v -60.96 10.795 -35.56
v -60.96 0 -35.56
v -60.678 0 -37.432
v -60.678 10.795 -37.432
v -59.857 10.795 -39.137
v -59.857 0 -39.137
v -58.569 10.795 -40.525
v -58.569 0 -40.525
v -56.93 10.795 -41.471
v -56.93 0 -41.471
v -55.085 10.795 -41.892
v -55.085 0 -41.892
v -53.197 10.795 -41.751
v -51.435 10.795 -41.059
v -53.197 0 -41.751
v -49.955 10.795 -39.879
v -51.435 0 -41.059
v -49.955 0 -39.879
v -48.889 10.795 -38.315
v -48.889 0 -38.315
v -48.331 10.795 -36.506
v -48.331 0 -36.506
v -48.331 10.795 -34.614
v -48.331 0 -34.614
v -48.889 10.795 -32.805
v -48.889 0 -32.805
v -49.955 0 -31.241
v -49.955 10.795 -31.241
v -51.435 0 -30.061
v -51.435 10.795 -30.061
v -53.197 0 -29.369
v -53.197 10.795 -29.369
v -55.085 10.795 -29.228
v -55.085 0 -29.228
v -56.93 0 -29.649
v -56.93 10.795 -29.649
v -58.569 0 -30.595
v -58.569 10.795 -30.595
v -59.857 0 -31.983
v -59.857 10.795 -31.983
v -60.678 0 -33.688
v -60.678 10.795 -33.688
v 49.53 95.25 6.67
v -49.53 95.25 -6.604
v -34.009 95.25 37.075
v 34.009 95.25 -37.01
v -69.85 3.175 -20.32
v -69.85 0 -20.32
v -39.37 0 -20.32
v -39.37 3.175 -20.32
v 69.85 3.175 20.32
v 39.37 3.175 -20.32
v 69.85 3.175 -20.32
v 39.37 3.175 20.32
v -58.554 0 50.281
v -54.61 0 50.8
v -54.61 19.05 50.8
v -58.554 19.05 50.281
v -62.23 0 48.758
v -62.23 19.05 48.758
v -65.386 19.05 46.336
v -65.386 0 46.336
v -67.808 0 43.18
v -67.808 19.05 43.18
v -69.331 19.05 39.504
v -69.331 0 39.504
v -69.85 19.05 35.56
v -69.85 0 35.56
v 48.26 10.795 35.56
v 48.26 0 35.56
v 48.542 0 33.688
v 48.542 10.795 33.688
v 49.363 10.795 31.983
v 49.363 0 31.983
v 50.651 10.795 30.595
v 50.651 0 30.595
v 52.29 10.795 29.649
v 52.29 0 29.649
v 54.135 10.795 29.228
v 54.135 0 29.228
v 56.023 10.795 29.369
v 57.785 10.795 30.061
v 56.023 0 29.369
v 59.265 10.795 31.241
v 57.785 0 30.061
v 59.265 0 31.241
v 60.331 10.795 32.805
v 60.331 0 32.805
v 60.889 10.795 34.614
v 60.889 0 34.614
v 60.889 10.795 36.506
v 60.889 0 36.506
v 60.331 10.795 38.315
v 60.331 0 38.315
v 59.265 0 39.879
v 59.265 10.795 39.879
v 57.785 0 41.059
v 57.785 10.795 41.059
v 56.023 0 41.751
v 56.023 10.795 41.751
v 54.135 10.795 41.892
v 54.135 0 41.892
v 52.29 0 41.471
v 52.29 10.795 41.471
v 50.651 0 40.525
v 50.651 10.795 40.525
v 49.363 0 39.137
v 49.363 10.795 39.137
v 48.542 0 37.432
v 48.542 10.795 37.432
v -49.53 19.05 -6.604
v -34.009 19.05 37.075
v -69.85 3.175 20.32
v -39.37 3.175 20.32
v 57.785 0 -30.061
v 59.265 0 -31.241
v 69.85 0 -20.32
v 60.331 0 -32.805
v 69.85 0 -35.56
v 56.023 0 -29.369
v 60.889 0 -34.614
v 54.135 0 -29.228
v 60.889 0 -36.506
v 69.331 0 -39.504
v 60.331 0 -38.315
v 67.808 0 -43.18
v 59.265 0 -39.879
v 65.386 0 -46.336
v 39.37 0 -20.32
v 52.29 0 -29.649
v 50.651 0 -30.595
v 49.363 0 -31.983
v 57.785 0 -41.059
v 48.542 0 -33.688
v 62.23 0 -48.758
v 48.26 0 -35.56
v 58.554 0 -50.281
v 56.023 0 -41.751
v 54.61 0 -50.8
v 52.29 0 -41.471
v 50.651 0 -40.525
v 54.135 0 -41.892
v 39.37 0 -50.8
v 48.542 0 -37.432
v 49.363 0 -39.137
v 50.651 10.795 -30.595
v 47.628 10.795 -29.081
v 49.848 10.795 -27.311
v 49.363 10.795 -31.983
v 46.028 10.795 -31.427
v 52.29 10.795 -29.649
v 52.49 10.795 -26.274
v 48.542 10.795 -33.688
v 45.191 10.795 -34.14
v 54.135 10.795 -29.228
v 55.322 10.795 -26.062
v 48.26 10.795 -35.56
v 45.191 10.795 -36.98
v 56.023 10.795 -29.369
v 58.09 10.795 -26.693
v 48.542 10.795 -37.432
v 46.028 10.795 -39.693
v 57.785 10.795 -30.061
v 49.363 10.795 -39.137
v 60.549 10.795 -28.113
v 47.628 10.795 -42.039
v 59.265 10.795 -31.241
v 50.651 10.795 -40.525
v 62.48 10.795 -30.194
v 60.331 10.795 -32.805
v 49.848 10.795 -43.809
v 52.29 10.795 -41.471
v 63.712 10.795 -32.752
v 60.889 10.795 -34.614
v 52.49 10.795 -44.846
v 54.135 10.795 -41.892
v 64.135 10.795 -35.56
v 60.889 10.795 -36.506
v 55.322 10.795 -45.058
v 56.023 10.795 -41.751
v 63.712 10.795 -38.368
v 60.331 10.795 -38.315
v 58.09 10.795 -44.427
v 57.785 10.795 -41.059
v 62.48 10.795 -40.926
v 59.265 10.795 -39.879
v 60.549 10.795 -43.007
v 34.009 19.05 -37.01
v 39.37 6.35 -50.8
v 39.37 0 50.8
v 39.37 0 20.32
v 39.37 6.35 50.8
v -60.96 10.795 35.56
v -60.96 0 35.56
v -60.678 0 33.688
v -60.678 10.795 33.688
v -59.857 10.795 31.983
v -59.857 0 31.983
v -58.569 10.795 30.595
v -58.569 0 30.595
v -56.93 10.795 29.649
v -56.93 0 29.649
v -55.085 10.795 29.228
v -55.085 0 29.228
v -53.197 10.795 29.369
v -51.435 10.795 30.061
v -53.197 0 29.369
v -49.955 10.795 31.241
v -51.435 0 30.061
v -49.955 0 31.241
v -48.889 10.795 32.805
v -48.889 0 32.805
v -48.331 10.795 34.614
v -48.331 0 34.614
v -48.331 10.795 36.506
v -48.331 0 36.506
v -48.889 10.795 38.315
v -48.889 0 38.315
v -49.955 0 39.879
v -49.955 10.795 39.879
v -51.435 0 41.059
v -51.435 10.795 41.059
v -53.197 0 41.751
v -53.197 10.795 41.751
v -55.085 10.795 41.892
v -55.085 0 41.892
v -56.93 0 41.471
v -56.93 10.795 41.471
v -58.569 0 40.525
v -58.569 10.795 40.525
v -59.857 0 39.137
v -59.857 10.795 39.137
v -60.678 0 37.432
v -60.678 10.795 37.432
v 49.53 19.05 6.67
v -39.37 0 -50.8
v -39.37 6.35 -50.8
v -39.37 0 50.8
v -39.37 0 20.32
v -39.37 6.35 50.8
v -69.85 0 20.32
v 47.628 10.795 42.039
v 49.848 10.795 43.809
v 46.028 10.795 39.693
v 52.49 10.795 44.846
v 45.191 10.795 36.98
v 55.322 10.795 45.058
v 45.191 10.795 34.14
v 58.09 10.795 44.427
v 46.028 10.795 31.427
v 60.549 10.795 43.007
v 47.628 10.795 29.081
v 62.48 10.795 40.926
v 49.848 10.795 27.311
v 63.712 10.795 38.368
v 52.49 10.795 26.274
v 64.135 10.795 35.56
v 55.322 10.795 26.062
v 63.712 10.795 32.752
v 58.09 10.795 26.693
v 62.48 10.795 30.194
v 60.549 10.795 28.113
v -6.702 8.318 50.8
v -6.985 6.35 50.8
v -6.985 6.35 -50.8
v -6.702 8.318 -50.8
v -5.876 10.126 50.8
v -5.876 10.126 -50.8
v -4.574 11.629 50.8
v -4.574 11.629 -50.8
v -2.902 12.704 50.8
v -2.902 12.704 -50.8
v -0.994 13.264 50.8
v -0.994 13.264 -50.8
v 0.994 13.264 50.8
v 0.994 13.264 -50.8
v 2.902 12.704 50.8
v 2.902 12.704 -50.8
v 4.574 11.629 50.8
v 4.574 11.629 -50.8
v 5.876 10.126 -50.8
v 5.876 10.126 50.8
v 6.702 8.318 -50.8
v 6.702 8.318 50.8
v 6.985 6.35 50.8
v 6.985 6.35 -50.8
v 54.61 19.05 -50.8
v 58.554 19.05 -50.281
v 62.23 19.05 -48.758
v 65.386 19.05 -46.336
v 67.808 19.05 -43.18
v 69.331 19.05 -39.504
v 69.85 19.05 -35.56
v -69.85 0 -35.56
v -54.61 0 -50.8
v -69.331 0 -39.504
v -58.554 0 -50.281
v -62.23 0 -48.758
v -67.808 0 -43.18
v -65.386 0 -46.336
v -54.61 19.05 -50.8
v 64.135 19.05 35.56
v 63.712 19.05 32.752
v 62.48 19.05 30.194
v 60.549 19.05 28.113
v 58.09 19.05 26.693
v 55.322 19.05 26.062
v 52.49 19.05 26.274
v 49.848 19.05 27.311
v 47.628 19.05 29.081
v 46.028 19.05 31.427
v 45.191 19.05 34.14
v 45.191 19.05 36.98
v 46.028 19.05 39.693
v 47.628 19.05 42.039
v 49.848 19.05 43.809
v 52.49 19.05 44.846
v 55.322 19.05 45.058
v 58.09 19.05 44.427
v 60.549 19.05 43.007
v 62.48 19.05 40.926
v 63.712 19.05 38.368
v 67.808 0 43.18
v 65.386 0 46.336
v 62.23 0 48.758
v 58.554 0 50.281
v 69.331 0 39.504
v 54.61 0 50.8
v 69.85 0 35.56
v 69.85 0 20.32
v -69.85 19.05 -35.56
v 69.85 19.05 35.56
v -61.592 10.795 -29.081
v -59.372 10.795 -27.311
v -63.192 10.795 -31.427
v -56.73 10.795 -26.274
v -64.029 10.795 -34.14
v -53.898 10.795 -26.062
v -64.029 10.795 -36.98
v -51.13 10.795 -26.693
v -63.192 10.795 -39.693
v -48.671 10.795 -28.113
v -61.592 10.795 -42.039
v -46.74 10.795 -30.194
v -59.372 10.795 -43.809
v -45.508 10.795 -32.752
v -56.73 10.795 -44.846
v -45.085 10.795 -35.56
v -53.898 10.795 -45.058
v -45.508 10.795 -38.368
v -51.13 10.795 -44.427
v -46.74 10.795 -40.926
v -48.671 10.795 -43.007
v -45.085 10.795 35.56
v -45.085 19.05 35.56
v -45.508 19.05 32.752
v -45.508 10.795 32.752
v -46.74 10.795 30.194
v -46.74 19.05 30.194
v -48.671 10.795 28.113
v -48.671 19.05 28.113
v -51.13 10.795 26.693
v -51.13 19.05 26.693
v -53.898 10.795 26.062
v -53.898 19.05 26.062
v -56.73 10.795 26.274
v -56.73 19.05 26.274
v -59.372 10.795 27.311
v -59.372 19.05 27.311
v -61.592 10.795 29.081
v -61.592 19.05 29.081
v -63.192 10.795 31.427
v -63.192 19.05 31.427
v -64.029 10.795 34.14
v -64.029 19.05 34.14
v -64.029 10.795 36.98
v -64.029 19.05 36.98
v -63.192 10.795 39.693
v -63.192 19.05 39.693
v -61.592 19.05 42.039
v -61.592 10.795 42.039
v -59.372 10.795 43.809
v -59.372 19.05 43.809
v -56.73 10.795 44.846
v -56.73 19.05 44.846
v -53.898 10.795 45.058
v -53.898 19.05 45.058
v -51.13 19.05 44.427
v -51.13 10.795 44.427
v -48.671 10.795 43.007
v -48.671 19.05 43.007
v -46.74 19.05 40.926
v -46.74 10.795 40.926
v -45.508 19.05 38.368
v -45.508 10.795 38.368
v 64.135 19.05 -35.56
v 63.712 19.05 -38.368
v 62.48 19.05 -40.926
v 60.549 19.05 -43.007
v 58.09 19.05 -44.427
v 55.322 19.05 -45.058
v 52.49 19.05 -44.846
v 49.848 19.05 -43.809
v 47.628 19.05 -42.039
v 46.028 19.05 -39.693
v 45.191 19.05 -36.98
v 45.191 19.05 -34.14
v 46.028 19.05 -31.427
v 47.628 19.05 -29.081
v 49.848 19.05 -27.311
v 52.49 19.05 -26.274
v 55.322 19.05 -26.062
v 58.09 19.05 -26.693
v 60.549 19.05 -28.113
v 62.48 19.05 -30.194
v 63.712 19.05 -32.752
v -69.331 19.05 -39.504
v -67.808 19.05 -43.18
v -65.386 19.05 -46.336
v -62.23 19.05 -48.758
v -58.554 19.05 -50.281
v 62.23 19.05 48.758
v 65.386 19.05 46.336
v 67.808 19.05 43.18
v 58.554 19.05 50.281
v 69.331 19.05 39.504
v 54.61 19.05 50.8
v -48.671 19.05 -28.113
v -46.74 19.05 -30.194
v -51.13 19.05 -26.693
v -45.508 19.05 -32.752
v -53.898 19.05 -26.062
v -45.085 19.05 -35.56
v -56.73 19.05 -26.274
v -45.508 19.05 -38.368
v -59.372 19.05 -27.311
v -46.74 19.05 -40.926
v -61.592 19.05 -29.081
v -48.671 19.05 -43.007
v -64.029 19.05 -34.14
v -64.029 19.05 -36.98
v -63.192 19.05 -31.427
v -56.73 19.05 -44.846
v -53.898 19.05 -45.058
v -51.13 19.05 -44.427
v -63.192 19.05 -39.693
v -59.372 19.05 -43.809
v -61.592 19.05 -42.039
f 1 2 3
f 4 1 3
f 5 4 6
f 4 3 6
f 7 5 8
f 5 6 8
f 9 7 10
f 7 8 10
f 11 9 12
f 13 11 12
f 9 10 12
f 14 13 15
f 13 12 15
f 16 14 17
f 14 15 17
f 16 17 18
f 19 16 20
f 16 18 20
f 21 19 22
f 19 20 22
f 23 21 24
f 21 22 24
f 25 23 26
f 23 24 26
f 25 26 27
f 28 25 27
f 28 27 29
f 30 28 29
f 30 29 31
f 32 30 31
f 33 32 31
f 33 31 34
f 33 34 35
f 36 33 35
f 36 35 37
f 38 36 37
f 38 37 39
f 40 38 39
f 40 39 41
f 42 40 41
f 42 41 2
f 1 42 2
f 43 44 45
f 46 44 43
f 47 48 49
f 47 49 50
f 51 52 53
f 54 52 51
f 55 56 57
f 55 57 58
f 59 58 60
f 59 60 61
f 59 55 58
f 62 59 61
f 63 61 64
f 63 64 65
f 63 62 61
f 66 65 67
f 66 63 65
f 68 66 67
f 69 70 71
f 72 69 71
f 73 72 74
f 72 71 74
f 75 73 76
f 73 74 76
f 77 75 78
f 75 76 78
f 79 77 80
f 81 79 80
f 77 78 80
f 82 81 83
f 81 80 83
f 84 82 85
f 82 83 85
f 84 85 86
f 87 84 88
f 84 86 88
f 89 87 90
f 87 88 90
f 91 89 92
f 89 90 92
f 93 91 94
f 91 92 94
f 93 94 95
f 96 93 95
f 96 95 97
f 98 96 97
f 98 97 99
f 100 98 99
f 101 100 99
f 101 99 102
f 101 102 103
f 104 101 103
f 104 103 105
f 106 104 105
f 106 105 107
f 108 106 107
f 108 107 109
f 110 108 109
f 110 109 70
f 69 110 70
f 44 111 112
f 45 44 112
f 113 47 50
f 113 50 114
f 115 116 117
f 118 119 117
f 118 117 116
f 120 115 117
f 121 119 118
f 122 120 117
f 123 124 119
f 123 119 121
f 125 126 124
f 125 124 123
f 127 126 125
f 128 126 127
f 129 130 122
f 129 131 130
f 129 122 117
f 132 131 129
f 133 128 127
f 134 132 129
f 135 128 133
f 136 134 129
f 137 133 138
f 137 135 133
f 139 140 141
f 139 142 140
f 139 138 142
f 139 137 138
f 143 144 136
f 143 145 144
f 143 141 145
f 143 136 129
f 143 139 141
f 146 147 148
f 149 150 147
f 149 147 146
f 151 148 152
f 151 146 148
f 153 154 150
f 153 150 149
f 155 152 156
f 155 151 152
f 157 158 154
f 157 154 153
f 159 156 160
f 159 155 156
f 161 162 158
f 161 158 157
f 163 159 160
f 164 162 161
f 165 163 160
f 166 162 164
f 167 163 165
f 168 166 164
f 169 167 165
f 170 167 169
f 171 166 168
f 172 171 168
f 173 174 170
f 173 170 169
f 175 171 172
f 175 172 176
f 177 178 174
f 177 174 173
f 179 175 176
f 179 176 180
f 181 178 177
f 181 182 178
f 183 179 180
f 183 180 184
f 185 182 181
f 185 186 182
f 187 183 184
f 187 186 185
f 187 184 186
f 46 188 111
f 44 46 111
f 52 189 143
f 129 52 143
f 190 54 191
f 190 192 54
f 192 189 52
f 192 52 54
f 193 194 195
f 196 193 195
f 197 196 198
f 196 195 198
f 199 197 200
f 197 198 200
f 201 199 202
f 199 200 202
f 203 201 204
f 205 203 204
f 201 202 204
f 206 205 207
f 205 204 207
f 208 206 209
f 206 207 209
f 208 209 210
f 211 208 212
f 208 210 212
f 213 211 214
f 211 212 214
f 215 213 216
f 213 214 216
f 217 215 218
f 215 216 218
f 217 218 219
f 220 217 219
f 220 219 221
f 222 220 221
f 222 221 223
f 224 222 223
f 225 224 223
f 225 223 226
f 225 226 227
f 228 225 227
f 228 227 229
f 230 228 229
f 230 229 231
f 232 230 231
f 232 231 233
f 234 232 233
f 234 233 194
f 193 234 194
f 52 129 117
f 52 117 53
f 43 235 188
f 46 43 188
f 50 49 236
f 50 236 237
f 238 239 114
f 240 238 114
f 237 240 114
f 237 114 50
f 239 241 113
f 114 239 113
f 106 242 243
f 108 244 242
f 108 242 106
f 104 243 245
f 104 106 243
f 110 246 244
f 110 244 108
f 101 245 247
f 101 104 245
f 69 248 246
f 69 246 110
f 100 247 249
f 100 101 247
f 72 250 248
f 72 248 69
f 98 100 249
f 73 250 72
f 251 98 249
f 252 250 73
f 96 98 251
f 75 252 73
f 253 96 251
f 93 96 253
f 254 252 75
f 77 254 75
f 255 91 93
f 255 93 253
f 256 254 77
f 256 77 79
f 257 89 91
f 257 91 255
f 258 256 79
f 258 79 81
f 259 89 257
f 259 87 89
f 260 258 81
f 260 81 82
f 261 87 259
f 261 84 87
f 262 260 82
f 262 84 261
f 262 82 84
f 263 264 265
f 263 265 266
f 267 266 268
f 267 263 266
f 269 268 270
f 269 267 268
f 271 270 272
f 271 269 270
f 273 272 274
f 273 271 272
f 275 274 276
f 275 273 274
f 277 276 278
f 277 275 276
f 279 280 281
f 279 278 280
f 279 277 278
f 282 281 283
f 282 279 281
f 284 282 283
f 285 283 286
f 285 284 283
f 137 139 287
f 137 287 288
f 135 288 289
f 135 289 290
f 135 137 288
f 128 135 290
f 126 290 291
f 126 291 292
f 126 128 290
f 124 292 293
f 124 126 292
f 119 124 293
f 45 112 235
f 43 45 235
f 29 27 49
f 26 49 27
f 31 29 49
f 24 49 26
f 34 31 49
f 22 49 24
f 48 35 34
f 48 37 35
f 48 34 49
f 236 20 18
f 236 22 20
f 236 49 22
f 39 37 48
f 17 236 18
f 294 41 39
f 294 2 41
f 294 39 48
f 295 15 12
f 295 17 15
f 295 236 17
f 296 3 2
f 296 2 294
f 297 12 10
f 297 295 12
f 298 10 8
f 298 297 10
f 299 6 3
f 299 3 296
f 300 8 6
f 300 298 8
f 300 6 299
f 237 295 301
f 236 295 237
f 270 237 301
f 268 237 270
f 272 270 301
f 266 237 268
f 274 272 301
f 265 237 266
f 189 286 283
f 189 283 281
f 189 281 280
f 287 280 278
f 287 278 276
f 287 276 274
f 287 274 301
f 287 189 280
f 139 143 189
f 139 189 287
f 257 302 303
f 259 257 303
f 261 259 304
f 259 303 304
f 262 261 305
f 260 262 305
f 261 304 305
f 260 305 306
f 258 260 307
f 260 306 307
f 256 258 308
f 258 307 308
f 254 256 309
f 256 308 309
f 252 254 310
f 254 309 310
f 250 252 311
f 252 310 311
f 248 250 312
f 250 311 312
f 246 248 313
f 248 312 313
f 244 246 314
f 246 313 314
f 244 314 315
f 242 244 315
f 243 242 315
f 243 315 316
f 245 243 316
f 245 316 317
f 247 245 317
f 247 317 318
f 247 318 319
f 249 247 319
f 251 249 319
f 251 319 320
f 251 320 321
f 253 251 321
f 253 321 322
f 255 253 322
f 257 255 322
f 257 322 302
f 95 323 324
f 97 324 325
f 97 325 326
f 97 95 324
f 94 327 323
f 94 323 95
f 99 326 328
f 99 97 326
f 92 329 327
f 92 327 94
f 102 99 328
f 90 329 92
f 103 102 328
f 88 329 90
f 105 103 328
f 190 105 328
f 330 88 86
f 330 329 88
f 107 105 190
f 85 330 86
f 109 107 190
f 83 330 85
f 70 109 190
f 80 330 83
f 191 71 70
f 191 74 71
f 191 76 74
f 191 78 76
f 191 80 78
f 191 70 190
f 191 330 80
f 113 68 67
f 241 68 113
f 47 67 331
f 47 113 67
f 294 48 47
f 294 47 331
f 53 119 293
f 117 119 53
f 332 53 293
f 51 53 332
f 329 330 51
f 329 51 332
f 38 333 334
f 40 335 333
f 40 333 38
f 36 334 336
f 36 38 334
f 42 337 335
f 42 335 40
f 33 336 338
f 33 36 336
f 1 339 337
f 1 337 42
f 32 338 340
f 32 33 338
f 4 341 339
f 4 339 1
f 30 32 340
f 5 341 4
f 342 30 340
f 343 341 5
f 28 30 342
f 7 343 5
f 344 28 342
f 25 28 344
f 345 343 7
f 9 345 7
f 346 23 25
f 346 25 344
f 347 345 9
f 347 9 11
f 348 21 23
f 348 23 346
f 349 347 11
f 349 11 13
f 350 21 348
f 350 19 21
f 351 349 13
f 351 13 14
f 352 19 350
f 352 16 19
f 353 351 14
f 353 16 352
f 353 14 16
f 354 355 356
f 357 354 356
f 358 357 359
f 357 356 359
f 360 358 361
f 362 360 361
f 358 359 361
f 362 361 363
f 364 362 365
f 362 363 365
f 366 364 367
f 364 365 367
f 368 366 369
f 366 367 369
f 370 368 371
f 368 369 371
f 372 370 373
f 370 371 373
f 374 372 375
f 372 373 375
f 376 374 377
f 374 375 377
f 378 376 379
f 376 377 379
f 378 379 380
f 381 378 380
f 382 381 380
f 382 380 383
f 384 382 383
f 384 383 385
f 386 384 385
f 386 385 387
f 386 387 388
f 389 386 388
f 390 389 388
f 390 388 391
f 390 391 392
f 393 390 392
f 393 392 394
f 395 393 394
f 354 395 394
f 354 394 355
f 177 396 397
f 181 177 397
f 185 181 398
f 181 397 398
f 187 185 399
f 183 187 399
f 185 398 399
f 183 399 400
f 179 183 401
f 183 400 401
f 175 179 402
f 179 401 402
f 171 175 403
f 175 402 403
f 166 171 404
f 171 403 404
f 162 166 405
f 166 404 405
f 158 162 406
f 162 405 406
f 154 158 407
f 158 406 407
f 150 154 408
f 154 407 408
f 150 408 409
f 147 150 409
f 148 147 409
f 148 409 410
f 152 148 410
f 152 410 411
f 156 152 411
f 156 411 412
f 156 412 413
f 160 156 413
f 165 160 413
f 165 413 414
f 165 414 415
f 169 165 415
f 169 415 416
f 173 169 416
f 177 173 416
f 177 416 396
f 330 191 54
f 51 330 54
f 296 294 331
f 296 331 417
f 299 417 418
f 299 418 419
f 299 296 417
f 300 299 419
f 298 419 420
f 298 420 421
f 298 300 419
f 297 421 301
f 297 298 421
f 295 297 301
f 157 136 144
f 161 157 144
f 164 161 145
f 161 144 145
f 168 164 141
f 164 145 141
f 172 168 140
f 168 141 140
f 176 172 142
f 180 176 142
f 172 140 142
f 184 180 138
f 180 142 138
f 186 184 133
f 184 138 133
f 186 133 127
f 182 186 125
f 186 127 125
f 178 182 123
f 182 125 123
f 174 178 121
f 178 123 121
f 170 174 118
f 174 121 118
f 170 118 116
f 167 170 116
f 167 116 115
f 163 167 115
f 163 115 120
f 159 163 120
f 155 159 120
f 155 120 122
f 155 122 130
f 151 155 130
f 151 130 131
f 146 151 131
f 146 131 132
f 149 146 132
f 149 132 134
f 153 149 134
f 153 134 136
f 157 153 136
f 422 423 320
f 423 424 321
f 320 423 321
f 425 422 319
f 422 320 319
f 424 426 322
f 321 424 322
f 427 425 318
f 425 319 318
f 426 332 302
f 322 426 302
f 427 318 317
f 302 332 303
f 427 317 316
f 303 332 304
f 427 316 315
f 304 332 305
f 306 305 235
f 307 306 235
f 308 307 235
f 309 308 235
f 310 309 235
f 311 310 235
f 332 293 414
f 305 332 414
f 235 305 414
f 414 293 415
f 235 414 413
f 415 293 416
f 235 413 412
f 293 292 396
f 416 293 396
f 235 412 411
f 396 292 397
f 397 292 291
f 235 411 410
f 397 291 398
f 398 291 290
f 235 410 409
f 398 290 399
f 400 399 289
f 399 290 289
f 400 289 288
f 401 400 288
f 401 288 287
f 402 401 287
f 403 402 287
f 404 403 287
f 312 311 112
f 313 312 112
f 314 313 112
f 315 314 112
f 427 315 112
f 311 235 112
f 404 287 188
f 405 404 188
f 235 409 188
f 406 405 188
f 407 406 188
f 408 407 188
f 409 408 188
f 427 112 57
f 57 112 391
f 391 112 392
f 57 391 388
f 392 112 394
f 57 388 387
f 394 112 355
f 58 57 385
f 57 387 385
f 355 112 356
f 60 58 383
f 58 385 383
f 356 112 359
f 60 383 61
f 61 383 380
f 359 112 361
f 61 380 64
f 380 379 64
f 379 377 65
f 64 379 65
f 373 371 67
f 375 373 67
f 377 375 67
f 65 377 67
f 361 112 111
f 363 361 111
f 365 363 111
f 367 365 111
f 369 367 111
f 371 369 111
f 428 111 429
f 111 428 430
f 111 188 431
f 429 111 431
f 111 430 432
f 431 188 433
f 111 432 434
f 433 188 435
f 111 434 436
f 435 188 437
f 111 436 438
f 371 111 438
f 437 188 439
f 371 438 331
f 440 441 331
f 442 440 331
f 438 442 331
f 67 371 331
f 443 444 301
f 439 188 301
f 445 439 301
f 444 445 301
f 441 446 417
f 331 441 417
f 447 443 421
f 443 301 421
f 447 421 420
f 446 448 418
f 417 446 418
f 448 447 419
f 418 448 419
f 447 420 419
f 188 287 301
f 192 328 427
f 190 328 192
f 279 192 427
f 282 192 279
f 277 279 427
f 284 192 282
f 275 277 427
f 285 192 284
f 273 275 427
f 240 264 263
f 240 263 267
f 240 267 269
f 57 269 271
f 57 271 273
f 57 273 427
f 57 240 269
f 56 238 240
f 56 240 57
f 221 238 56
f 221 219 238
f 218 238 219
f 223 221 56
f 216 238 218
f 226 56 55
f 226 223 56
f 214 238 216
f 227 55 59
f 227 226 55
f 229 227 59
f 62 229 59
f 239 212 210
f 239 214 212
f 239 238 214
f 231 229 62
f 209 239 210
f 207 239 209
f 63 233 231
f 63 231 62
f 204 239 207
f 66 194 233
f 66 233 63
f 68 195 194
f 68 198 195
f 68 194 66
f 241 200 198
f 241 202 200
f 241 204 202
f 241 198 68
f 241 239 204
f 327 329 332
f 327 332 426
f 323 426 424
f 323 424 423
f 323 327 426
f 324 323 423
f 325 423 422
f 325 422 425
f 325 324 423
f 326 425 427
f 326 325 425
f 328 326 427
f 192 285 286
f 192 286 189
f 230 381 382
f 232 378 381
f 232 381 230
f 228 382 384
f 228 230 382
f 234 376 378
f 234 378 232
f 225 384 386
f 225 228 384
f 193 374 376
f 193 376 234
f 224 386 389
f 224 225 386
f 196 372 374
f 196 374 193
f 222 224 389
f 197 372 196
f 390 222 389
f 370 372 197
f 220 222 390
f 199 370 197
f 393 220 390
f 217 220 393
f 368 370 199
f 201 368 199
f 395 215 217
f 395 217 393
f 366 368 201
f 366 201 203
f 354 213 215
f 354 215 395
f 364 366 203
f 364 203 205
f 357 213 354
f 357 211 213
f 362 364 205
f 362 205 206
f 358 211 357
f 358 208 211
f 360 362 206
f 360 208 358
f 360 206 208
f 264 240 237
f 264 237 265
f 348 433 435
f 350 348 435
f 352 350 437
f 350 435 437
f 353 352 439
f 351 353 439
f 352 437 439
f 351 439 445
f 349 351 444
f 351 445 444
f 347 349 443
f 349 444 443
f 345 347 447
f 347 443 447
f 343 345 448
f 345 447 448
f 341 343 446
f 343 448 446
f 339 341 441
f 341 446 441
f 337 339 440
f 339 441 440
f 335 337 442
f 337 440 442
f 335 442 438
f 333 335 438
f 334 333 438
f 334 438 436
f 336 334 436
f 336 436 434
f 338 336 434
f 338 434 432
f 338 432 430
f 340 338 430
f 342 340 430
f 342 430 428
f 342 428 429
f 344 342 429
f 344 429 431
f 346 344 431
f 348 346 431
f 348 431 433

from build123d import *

# Parameters (mm, degrees)
BOSS_EXTRUDE1_DEPTH                      = 19.05
CBORE_FOR_1_2_HEX_HEAD_BOLT1_D           = 12.7
CBORE_FOR_1_2_HEX_HEAD_BOLT1_DEPTH       = 19.05
CBORE_FOR_1_2_HEX_HEAD_BOLT1_CBORE_D     = 19.05
CBORE_FOR_1_2_HEX_HEAD_BOLT1_CBORE_DEPTH = 8.255
CUT_EXTRUDE1_DEPTH                       = 102.6
SKETCH5_W                                = 40.64
SKETCH5_H                                = 3.175
CUT_EXTRUDE2_DEPTH                       = 140.7
BOSS_EXTRUDE2_DEPTH                      = 76.2


with BuildPart() as part:
    # Sketch1 → Boss-Extrude1 (new body)
    with BuildSketch(Plane(origin=(0, 0, 0), x_dir=(1, 0, 0), z_dir=(0, 1, 0))):
        with BuildLine():
            Line((-54.61, 50.8), (54.61, 50.8))
            ThreePointArc((54.61, 50.8), (65.386307345, 46.336307345), (69.85, 35.56))
            Line((69.85, 35.56), (69.85, -35.56))
            ThreePointArc((69.85, -35.56), (65.386307345, -46.336307345), (54.61, -50.8))
            Line((54.61, -50.8), (-54.61, -50.8))
            ThreePointArc((-54.61, -50.8), (-65.386307345, -46.336307345), (-69.85, -35.56))
            Line((-69.85, -35.56), (-69.85, 35.56))
            ThreePointArc((-69.85, 35.56), (-65.386307345, 46.336307345), (-54.61, 50.8))
        make_face()
    extrude(amount=BOSS_EXTRUDE1_DEPTH)

    # CBORE for 1/2 Hex Head Bolt1
    with Locations(Plane(origin=(0, 19.05, 0), x_dir=(1, 0, 0), z_dir=(0, 1, 0))):
        with Locations((-54.61, 35.56), (54.61, 35.56), (-54.61, -35.56), (54.61, -35.56)):
            CounterBoreHole(CBORE_FOR_1_2_HEX_HEAD_BOLT1_D / 2, CBORE_FOR_1_2_HEX_HEAD_BOLT1_CBORE_D / 2, CBORE_FOR_1_2_HEX_HEAD_BOLT1_CBORE_DEPTH, depth=CBORE_FOR_1_2_HEX_HEAD_BOLT1_DEPTH)

    # Sketch4 → Cut-Extrude1 (cut, through all)
    with BuildSketch(Plane.XY.offset(50.8)):
        with BuildLine():
            Line((-39.37, 0), (-39.37, 6.35))
            Line((-39.37, 6.35), (-6.985, 6.35))
            ThreePointArc((-6.985, 6.35), (0, 13.335), (6.985, 6.35))
            Line((6.985, 6.35), (39.37, 6.35))
            Line((39.37, 6.35), (39.37, 0))
            Line((39.37, 0), (-39.37, 0))
        make_face()
    extrude(amount=-CUT_EXTRUDE1_DEPTH, mode=Mode.SUBTRACT)

    # Sketch5 → Cut-Extrude2 (cut, through all)
    with BuildSketch(Plane.ZY.offset(69.85)):
        with Locations((0, 1.5875)):
            Rectangle(SKETCH5_W, SKETCH5_H)
    extrude(amount=-CUT_EXTRUDE2_DEPTH, mode=Mode.SUBTRACT)

    # Sketch6 → Boss-Extrude2 (add)
    with BuildSketch(Plane(origin=(0, 19.05, 0), x_dir=(1, 0, 0), z_dir=(0, 1, 0))):
        Polygon((-49.53, 6.604), (-34.008673988, -37.075222335), (49.53, -6.669631594), (34.008673988, 37.009590742), align=None)
    extrude(amount=BOSS_EXTRUDE2_DEPTH)


solid = part.part
